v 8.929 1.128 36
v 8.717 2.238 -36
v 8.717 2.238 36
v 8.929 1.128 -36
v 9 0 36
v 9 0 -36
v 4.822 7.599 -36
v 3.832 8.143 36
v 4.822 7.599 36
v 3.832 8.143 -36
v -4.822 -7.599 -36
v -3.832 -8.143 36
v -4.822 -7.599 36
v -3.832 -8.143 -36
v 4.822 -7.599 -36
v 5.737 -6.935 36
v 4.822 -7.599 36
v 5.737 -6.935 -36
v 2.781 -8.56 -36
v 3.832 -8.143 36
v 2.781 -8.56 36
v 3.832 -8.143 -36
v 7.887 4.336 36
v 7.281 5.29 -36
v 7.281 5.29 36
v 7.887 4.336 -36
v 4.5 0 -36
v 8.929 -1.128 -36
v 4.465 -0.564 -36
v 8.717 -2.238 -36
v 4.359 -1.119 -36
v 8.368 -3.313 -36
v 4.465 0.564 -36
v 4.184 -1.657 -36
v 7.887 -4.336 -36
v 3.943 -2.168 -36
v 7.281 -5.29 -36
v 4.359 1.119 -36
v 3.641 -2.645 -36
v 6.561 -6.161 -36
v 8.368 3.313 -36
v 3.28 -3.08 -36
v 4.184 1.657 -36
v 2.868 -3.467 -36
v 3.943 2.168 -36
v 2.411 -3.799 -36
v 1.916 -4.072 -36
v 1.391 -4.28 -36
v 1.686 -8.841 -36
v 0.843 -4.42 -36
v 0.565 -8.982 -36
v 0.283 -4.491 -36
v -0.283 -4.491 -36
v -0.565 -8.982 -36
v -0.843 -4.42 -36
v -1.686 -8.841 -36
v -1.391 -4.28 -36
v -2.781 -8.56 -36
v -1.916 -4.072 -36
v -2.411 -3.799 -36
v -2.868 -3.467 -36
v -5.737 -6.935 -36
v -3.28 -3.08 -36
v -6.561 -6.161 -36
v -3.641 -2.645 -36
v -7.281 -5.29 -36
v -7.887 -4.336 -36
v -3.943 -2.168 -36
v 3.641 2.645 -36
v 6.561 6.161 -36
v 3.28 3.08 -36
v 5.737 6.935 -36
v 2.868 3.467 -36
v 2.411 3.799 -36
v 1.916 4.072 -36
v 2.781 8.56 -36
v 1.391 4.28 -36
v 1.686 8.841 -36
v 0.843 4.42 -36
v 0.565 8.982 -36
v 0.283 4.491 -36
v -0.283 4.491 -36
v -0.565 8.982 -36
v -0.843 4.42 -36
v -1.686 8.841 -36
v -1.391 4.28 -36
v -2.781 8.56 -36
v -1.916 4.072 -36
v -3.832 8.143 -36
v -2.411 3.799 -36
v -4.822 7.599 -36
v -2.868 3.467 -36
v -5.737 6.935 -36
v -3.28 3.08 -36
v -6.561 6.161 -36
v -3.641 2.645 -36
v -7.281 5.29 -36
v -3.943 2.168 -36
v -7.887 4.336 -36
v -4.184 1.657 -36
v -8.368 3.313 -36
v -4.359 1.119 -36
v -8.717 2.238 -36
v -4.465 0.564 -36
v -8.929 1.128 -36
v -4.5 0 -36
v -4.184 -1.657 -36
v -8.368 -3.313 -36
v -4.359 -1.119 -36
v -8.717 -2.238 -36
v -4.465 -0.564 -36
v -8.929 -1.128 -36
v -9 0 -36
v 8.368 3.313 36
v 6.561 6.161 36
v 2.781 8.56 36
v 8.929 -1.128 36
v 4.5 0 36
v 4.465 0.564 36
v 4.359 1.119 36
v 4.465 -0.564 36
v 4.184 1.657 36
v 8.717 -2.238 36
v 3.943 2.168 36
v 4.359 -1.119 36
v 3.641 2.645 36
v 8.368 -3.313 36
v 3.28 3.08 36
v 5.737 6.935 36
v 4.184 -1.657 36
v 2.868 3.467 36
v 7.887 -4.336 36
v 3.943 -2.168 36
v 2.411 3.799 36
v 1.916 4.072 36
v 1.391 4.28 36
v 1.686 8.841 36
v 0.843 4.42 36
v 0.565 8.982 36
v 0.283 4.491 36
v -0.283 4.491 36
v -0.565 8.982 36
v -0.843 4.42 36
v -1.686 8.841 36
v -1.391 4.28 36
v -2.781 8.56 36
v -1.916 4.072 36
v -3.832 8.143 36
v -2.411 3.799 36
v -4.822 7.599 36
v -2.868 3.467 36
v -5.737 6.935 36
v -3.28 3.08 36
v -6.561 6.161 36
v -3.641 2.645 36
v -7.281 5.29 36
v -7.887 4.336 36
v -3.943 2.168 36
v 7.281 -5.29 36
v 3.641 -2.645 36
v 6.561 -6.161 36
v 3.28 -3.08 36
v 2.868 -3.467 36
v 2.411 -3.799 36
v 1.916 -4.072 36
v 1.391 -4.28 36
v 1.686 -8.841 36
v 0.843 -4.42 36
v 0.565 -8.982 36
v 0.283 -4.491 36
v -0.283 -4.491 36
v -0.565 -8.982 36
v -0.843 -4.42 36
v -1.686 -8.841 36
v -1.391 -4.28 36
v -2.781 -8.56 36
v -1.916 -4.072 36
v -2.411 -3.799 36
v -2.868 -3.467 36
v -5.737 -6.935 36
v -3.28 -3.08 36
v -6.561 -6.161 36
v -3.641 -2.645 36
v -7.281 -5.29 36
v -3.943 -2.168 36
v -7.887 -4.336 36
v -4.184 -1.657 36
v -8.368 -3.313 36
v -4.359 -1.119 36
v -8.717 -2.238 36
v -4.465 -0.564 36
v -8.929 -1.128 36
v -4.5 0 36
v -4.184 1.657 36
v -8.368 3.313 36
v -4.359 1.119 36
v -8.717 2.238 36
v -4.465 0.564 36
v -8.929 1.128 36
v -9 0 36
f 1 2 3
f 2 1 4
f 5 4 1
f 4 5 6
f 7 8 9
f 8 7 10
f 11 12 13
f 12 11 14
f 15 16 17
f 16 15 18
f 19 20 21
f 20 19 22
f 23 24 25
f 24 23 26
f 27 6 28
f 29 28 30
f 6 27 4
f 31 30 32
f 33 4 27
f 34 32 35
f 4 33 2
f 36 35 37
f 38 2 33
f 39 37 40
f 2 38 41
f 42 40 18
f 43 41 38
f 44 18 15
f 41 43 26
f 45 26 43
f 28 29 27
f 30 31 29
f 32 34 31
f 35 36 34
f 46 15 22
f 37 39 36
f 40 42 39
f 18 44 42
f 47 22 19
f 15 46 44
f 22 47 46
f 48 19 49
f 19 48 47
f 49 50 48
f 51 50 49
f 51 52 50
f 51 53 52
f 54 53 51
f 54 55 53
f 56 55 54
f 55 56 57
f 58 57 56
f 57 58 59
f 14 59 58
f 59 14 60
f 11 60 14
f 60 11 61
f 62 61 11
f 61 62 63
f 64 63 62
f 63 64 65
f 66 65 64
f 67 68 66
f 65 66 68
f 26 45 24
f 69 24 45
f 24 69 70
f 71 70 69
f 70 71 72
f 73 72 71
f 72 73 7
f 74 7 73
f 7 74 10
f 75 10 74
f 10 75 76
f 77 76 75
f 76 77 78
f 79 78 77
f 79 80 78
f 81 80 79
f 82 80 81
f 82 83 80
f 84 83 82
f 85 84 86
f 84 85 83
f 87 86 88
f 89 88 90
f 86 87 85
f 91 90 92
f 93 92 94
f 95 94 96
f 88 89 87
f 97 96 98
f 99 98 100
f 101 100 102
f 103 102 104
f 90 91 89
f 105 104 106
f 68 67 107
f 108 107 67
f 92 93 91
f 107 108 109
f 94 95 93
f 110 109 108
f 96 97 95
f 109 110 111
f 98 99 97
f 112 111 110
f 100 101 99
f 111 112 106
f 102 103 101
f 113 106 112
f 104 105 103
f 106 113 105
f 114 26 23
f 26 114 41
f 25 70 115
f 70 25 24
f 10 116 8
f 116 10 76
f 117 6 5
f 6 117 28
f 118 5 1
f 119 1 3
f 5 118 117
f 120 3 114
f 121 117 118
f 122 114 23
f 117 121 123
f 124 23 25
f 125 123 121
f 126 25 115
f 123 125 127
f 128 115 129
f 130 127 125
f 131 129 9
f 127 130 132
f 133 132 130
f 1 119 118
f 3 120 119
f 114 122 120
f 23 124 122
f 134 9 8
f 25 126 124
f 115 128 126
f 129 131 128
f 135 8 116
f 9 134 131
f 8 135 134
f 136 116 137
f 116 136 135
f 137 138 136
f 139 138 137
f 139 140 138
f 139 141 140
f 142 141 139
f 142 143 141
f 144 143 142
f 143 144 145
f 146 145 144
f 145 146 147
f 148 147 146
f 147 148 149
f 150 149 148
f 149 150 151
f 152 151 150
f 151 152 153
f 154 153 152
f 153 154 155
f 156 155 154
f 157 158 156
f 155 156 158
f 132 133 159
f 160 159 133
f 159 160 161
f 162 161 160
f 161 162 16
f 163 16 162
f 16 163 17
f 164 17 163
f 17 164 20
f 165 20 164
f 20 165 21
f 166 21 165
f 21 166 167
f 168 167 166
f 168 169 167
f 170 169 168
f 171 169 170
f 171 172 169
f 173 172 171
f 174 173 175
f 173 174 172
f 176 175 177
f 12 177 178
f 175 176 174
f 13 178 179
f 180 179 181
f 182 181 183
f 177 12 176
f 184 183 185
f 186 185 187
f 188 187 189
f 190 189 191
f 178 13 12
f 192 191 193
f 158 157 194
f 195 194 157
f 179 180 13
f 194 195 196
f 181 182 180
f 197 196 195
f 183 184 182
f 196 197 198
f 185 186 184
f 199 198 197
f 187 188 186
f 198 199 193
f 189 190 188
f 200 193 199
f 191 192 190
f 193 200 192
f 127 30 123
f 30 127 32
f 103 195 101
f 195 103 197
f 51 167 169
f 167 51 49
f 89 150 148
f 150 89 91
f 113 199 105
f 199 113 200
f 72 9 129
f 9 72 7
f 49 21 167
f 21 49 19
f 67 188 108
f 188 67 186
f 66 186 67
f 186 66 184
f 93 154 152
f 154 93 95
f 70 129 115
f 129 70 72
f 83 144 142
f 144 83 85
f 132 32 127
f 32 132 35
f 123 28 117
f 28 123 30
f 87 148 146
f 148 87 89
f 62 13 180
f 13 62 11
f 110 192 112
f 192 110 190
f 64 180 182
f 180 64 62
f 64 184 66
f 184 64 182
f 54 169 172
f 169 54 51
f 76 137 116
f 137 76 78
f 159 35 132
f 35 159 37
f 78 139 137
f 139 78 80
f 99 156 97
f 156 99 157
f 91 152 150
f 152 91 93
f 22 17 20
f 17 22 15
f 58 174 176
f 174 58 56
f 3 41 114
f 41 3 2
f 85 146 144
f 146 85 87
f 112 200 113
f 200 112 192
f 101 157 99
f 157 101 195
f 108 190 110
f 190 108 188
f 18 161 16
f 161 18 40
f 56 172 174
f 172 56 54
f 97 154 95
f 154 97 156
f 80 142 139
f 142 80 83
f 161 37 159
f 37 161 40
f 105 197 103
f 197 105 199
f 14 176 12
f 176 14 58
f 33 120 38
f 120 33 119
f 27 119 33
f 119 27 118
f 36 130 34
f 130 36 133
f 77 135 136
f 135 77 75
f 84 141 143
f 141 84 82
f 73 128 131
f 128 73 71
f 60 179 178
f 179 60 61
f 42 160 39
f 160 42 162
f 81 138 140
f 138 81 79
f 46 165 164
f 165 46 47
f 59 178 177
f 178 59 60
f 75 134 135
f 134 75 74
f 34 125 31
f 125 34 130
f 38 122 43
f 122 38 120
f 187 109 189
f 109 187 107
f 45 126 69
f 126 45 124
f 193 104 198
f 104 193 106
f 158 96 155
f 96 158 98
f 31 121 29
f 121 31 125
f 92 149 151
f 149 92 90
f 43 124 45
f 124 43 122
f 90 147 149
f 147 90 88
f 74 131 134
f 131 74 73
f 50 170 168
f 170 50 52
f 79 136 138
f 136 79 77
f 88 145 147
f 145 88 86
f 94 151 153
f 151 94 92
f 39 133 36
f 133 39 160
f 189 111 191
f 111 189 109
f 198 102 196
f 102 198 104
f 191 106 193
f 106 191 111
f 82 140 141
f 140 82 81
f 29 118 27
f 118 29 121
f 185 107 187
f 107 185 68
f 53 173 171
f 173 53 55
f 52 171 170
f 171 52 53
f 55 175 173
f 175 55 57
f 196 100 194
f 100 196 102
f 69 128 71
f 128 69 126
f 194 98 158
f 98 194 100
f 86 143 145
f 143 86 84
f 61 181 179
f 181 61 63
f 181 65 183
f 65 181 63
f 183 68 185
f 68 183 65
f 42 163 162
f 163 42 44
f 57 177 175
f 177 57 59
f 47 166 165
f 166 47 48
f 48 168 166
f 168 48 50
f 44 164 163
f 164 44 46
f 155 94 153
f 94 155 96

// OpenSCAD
$fn = 50;


difference() {
	union() {
		translate(v = [0, 0, -36.0000000000]) {
			cylinder(h = 72, r = 9.0000000000);
		}
	}
	union() {
		translate(v = [0, 0, -100.0000000000]) {
			cylinder(h = 200, r = 4.5000000000);
		}
	}
}
